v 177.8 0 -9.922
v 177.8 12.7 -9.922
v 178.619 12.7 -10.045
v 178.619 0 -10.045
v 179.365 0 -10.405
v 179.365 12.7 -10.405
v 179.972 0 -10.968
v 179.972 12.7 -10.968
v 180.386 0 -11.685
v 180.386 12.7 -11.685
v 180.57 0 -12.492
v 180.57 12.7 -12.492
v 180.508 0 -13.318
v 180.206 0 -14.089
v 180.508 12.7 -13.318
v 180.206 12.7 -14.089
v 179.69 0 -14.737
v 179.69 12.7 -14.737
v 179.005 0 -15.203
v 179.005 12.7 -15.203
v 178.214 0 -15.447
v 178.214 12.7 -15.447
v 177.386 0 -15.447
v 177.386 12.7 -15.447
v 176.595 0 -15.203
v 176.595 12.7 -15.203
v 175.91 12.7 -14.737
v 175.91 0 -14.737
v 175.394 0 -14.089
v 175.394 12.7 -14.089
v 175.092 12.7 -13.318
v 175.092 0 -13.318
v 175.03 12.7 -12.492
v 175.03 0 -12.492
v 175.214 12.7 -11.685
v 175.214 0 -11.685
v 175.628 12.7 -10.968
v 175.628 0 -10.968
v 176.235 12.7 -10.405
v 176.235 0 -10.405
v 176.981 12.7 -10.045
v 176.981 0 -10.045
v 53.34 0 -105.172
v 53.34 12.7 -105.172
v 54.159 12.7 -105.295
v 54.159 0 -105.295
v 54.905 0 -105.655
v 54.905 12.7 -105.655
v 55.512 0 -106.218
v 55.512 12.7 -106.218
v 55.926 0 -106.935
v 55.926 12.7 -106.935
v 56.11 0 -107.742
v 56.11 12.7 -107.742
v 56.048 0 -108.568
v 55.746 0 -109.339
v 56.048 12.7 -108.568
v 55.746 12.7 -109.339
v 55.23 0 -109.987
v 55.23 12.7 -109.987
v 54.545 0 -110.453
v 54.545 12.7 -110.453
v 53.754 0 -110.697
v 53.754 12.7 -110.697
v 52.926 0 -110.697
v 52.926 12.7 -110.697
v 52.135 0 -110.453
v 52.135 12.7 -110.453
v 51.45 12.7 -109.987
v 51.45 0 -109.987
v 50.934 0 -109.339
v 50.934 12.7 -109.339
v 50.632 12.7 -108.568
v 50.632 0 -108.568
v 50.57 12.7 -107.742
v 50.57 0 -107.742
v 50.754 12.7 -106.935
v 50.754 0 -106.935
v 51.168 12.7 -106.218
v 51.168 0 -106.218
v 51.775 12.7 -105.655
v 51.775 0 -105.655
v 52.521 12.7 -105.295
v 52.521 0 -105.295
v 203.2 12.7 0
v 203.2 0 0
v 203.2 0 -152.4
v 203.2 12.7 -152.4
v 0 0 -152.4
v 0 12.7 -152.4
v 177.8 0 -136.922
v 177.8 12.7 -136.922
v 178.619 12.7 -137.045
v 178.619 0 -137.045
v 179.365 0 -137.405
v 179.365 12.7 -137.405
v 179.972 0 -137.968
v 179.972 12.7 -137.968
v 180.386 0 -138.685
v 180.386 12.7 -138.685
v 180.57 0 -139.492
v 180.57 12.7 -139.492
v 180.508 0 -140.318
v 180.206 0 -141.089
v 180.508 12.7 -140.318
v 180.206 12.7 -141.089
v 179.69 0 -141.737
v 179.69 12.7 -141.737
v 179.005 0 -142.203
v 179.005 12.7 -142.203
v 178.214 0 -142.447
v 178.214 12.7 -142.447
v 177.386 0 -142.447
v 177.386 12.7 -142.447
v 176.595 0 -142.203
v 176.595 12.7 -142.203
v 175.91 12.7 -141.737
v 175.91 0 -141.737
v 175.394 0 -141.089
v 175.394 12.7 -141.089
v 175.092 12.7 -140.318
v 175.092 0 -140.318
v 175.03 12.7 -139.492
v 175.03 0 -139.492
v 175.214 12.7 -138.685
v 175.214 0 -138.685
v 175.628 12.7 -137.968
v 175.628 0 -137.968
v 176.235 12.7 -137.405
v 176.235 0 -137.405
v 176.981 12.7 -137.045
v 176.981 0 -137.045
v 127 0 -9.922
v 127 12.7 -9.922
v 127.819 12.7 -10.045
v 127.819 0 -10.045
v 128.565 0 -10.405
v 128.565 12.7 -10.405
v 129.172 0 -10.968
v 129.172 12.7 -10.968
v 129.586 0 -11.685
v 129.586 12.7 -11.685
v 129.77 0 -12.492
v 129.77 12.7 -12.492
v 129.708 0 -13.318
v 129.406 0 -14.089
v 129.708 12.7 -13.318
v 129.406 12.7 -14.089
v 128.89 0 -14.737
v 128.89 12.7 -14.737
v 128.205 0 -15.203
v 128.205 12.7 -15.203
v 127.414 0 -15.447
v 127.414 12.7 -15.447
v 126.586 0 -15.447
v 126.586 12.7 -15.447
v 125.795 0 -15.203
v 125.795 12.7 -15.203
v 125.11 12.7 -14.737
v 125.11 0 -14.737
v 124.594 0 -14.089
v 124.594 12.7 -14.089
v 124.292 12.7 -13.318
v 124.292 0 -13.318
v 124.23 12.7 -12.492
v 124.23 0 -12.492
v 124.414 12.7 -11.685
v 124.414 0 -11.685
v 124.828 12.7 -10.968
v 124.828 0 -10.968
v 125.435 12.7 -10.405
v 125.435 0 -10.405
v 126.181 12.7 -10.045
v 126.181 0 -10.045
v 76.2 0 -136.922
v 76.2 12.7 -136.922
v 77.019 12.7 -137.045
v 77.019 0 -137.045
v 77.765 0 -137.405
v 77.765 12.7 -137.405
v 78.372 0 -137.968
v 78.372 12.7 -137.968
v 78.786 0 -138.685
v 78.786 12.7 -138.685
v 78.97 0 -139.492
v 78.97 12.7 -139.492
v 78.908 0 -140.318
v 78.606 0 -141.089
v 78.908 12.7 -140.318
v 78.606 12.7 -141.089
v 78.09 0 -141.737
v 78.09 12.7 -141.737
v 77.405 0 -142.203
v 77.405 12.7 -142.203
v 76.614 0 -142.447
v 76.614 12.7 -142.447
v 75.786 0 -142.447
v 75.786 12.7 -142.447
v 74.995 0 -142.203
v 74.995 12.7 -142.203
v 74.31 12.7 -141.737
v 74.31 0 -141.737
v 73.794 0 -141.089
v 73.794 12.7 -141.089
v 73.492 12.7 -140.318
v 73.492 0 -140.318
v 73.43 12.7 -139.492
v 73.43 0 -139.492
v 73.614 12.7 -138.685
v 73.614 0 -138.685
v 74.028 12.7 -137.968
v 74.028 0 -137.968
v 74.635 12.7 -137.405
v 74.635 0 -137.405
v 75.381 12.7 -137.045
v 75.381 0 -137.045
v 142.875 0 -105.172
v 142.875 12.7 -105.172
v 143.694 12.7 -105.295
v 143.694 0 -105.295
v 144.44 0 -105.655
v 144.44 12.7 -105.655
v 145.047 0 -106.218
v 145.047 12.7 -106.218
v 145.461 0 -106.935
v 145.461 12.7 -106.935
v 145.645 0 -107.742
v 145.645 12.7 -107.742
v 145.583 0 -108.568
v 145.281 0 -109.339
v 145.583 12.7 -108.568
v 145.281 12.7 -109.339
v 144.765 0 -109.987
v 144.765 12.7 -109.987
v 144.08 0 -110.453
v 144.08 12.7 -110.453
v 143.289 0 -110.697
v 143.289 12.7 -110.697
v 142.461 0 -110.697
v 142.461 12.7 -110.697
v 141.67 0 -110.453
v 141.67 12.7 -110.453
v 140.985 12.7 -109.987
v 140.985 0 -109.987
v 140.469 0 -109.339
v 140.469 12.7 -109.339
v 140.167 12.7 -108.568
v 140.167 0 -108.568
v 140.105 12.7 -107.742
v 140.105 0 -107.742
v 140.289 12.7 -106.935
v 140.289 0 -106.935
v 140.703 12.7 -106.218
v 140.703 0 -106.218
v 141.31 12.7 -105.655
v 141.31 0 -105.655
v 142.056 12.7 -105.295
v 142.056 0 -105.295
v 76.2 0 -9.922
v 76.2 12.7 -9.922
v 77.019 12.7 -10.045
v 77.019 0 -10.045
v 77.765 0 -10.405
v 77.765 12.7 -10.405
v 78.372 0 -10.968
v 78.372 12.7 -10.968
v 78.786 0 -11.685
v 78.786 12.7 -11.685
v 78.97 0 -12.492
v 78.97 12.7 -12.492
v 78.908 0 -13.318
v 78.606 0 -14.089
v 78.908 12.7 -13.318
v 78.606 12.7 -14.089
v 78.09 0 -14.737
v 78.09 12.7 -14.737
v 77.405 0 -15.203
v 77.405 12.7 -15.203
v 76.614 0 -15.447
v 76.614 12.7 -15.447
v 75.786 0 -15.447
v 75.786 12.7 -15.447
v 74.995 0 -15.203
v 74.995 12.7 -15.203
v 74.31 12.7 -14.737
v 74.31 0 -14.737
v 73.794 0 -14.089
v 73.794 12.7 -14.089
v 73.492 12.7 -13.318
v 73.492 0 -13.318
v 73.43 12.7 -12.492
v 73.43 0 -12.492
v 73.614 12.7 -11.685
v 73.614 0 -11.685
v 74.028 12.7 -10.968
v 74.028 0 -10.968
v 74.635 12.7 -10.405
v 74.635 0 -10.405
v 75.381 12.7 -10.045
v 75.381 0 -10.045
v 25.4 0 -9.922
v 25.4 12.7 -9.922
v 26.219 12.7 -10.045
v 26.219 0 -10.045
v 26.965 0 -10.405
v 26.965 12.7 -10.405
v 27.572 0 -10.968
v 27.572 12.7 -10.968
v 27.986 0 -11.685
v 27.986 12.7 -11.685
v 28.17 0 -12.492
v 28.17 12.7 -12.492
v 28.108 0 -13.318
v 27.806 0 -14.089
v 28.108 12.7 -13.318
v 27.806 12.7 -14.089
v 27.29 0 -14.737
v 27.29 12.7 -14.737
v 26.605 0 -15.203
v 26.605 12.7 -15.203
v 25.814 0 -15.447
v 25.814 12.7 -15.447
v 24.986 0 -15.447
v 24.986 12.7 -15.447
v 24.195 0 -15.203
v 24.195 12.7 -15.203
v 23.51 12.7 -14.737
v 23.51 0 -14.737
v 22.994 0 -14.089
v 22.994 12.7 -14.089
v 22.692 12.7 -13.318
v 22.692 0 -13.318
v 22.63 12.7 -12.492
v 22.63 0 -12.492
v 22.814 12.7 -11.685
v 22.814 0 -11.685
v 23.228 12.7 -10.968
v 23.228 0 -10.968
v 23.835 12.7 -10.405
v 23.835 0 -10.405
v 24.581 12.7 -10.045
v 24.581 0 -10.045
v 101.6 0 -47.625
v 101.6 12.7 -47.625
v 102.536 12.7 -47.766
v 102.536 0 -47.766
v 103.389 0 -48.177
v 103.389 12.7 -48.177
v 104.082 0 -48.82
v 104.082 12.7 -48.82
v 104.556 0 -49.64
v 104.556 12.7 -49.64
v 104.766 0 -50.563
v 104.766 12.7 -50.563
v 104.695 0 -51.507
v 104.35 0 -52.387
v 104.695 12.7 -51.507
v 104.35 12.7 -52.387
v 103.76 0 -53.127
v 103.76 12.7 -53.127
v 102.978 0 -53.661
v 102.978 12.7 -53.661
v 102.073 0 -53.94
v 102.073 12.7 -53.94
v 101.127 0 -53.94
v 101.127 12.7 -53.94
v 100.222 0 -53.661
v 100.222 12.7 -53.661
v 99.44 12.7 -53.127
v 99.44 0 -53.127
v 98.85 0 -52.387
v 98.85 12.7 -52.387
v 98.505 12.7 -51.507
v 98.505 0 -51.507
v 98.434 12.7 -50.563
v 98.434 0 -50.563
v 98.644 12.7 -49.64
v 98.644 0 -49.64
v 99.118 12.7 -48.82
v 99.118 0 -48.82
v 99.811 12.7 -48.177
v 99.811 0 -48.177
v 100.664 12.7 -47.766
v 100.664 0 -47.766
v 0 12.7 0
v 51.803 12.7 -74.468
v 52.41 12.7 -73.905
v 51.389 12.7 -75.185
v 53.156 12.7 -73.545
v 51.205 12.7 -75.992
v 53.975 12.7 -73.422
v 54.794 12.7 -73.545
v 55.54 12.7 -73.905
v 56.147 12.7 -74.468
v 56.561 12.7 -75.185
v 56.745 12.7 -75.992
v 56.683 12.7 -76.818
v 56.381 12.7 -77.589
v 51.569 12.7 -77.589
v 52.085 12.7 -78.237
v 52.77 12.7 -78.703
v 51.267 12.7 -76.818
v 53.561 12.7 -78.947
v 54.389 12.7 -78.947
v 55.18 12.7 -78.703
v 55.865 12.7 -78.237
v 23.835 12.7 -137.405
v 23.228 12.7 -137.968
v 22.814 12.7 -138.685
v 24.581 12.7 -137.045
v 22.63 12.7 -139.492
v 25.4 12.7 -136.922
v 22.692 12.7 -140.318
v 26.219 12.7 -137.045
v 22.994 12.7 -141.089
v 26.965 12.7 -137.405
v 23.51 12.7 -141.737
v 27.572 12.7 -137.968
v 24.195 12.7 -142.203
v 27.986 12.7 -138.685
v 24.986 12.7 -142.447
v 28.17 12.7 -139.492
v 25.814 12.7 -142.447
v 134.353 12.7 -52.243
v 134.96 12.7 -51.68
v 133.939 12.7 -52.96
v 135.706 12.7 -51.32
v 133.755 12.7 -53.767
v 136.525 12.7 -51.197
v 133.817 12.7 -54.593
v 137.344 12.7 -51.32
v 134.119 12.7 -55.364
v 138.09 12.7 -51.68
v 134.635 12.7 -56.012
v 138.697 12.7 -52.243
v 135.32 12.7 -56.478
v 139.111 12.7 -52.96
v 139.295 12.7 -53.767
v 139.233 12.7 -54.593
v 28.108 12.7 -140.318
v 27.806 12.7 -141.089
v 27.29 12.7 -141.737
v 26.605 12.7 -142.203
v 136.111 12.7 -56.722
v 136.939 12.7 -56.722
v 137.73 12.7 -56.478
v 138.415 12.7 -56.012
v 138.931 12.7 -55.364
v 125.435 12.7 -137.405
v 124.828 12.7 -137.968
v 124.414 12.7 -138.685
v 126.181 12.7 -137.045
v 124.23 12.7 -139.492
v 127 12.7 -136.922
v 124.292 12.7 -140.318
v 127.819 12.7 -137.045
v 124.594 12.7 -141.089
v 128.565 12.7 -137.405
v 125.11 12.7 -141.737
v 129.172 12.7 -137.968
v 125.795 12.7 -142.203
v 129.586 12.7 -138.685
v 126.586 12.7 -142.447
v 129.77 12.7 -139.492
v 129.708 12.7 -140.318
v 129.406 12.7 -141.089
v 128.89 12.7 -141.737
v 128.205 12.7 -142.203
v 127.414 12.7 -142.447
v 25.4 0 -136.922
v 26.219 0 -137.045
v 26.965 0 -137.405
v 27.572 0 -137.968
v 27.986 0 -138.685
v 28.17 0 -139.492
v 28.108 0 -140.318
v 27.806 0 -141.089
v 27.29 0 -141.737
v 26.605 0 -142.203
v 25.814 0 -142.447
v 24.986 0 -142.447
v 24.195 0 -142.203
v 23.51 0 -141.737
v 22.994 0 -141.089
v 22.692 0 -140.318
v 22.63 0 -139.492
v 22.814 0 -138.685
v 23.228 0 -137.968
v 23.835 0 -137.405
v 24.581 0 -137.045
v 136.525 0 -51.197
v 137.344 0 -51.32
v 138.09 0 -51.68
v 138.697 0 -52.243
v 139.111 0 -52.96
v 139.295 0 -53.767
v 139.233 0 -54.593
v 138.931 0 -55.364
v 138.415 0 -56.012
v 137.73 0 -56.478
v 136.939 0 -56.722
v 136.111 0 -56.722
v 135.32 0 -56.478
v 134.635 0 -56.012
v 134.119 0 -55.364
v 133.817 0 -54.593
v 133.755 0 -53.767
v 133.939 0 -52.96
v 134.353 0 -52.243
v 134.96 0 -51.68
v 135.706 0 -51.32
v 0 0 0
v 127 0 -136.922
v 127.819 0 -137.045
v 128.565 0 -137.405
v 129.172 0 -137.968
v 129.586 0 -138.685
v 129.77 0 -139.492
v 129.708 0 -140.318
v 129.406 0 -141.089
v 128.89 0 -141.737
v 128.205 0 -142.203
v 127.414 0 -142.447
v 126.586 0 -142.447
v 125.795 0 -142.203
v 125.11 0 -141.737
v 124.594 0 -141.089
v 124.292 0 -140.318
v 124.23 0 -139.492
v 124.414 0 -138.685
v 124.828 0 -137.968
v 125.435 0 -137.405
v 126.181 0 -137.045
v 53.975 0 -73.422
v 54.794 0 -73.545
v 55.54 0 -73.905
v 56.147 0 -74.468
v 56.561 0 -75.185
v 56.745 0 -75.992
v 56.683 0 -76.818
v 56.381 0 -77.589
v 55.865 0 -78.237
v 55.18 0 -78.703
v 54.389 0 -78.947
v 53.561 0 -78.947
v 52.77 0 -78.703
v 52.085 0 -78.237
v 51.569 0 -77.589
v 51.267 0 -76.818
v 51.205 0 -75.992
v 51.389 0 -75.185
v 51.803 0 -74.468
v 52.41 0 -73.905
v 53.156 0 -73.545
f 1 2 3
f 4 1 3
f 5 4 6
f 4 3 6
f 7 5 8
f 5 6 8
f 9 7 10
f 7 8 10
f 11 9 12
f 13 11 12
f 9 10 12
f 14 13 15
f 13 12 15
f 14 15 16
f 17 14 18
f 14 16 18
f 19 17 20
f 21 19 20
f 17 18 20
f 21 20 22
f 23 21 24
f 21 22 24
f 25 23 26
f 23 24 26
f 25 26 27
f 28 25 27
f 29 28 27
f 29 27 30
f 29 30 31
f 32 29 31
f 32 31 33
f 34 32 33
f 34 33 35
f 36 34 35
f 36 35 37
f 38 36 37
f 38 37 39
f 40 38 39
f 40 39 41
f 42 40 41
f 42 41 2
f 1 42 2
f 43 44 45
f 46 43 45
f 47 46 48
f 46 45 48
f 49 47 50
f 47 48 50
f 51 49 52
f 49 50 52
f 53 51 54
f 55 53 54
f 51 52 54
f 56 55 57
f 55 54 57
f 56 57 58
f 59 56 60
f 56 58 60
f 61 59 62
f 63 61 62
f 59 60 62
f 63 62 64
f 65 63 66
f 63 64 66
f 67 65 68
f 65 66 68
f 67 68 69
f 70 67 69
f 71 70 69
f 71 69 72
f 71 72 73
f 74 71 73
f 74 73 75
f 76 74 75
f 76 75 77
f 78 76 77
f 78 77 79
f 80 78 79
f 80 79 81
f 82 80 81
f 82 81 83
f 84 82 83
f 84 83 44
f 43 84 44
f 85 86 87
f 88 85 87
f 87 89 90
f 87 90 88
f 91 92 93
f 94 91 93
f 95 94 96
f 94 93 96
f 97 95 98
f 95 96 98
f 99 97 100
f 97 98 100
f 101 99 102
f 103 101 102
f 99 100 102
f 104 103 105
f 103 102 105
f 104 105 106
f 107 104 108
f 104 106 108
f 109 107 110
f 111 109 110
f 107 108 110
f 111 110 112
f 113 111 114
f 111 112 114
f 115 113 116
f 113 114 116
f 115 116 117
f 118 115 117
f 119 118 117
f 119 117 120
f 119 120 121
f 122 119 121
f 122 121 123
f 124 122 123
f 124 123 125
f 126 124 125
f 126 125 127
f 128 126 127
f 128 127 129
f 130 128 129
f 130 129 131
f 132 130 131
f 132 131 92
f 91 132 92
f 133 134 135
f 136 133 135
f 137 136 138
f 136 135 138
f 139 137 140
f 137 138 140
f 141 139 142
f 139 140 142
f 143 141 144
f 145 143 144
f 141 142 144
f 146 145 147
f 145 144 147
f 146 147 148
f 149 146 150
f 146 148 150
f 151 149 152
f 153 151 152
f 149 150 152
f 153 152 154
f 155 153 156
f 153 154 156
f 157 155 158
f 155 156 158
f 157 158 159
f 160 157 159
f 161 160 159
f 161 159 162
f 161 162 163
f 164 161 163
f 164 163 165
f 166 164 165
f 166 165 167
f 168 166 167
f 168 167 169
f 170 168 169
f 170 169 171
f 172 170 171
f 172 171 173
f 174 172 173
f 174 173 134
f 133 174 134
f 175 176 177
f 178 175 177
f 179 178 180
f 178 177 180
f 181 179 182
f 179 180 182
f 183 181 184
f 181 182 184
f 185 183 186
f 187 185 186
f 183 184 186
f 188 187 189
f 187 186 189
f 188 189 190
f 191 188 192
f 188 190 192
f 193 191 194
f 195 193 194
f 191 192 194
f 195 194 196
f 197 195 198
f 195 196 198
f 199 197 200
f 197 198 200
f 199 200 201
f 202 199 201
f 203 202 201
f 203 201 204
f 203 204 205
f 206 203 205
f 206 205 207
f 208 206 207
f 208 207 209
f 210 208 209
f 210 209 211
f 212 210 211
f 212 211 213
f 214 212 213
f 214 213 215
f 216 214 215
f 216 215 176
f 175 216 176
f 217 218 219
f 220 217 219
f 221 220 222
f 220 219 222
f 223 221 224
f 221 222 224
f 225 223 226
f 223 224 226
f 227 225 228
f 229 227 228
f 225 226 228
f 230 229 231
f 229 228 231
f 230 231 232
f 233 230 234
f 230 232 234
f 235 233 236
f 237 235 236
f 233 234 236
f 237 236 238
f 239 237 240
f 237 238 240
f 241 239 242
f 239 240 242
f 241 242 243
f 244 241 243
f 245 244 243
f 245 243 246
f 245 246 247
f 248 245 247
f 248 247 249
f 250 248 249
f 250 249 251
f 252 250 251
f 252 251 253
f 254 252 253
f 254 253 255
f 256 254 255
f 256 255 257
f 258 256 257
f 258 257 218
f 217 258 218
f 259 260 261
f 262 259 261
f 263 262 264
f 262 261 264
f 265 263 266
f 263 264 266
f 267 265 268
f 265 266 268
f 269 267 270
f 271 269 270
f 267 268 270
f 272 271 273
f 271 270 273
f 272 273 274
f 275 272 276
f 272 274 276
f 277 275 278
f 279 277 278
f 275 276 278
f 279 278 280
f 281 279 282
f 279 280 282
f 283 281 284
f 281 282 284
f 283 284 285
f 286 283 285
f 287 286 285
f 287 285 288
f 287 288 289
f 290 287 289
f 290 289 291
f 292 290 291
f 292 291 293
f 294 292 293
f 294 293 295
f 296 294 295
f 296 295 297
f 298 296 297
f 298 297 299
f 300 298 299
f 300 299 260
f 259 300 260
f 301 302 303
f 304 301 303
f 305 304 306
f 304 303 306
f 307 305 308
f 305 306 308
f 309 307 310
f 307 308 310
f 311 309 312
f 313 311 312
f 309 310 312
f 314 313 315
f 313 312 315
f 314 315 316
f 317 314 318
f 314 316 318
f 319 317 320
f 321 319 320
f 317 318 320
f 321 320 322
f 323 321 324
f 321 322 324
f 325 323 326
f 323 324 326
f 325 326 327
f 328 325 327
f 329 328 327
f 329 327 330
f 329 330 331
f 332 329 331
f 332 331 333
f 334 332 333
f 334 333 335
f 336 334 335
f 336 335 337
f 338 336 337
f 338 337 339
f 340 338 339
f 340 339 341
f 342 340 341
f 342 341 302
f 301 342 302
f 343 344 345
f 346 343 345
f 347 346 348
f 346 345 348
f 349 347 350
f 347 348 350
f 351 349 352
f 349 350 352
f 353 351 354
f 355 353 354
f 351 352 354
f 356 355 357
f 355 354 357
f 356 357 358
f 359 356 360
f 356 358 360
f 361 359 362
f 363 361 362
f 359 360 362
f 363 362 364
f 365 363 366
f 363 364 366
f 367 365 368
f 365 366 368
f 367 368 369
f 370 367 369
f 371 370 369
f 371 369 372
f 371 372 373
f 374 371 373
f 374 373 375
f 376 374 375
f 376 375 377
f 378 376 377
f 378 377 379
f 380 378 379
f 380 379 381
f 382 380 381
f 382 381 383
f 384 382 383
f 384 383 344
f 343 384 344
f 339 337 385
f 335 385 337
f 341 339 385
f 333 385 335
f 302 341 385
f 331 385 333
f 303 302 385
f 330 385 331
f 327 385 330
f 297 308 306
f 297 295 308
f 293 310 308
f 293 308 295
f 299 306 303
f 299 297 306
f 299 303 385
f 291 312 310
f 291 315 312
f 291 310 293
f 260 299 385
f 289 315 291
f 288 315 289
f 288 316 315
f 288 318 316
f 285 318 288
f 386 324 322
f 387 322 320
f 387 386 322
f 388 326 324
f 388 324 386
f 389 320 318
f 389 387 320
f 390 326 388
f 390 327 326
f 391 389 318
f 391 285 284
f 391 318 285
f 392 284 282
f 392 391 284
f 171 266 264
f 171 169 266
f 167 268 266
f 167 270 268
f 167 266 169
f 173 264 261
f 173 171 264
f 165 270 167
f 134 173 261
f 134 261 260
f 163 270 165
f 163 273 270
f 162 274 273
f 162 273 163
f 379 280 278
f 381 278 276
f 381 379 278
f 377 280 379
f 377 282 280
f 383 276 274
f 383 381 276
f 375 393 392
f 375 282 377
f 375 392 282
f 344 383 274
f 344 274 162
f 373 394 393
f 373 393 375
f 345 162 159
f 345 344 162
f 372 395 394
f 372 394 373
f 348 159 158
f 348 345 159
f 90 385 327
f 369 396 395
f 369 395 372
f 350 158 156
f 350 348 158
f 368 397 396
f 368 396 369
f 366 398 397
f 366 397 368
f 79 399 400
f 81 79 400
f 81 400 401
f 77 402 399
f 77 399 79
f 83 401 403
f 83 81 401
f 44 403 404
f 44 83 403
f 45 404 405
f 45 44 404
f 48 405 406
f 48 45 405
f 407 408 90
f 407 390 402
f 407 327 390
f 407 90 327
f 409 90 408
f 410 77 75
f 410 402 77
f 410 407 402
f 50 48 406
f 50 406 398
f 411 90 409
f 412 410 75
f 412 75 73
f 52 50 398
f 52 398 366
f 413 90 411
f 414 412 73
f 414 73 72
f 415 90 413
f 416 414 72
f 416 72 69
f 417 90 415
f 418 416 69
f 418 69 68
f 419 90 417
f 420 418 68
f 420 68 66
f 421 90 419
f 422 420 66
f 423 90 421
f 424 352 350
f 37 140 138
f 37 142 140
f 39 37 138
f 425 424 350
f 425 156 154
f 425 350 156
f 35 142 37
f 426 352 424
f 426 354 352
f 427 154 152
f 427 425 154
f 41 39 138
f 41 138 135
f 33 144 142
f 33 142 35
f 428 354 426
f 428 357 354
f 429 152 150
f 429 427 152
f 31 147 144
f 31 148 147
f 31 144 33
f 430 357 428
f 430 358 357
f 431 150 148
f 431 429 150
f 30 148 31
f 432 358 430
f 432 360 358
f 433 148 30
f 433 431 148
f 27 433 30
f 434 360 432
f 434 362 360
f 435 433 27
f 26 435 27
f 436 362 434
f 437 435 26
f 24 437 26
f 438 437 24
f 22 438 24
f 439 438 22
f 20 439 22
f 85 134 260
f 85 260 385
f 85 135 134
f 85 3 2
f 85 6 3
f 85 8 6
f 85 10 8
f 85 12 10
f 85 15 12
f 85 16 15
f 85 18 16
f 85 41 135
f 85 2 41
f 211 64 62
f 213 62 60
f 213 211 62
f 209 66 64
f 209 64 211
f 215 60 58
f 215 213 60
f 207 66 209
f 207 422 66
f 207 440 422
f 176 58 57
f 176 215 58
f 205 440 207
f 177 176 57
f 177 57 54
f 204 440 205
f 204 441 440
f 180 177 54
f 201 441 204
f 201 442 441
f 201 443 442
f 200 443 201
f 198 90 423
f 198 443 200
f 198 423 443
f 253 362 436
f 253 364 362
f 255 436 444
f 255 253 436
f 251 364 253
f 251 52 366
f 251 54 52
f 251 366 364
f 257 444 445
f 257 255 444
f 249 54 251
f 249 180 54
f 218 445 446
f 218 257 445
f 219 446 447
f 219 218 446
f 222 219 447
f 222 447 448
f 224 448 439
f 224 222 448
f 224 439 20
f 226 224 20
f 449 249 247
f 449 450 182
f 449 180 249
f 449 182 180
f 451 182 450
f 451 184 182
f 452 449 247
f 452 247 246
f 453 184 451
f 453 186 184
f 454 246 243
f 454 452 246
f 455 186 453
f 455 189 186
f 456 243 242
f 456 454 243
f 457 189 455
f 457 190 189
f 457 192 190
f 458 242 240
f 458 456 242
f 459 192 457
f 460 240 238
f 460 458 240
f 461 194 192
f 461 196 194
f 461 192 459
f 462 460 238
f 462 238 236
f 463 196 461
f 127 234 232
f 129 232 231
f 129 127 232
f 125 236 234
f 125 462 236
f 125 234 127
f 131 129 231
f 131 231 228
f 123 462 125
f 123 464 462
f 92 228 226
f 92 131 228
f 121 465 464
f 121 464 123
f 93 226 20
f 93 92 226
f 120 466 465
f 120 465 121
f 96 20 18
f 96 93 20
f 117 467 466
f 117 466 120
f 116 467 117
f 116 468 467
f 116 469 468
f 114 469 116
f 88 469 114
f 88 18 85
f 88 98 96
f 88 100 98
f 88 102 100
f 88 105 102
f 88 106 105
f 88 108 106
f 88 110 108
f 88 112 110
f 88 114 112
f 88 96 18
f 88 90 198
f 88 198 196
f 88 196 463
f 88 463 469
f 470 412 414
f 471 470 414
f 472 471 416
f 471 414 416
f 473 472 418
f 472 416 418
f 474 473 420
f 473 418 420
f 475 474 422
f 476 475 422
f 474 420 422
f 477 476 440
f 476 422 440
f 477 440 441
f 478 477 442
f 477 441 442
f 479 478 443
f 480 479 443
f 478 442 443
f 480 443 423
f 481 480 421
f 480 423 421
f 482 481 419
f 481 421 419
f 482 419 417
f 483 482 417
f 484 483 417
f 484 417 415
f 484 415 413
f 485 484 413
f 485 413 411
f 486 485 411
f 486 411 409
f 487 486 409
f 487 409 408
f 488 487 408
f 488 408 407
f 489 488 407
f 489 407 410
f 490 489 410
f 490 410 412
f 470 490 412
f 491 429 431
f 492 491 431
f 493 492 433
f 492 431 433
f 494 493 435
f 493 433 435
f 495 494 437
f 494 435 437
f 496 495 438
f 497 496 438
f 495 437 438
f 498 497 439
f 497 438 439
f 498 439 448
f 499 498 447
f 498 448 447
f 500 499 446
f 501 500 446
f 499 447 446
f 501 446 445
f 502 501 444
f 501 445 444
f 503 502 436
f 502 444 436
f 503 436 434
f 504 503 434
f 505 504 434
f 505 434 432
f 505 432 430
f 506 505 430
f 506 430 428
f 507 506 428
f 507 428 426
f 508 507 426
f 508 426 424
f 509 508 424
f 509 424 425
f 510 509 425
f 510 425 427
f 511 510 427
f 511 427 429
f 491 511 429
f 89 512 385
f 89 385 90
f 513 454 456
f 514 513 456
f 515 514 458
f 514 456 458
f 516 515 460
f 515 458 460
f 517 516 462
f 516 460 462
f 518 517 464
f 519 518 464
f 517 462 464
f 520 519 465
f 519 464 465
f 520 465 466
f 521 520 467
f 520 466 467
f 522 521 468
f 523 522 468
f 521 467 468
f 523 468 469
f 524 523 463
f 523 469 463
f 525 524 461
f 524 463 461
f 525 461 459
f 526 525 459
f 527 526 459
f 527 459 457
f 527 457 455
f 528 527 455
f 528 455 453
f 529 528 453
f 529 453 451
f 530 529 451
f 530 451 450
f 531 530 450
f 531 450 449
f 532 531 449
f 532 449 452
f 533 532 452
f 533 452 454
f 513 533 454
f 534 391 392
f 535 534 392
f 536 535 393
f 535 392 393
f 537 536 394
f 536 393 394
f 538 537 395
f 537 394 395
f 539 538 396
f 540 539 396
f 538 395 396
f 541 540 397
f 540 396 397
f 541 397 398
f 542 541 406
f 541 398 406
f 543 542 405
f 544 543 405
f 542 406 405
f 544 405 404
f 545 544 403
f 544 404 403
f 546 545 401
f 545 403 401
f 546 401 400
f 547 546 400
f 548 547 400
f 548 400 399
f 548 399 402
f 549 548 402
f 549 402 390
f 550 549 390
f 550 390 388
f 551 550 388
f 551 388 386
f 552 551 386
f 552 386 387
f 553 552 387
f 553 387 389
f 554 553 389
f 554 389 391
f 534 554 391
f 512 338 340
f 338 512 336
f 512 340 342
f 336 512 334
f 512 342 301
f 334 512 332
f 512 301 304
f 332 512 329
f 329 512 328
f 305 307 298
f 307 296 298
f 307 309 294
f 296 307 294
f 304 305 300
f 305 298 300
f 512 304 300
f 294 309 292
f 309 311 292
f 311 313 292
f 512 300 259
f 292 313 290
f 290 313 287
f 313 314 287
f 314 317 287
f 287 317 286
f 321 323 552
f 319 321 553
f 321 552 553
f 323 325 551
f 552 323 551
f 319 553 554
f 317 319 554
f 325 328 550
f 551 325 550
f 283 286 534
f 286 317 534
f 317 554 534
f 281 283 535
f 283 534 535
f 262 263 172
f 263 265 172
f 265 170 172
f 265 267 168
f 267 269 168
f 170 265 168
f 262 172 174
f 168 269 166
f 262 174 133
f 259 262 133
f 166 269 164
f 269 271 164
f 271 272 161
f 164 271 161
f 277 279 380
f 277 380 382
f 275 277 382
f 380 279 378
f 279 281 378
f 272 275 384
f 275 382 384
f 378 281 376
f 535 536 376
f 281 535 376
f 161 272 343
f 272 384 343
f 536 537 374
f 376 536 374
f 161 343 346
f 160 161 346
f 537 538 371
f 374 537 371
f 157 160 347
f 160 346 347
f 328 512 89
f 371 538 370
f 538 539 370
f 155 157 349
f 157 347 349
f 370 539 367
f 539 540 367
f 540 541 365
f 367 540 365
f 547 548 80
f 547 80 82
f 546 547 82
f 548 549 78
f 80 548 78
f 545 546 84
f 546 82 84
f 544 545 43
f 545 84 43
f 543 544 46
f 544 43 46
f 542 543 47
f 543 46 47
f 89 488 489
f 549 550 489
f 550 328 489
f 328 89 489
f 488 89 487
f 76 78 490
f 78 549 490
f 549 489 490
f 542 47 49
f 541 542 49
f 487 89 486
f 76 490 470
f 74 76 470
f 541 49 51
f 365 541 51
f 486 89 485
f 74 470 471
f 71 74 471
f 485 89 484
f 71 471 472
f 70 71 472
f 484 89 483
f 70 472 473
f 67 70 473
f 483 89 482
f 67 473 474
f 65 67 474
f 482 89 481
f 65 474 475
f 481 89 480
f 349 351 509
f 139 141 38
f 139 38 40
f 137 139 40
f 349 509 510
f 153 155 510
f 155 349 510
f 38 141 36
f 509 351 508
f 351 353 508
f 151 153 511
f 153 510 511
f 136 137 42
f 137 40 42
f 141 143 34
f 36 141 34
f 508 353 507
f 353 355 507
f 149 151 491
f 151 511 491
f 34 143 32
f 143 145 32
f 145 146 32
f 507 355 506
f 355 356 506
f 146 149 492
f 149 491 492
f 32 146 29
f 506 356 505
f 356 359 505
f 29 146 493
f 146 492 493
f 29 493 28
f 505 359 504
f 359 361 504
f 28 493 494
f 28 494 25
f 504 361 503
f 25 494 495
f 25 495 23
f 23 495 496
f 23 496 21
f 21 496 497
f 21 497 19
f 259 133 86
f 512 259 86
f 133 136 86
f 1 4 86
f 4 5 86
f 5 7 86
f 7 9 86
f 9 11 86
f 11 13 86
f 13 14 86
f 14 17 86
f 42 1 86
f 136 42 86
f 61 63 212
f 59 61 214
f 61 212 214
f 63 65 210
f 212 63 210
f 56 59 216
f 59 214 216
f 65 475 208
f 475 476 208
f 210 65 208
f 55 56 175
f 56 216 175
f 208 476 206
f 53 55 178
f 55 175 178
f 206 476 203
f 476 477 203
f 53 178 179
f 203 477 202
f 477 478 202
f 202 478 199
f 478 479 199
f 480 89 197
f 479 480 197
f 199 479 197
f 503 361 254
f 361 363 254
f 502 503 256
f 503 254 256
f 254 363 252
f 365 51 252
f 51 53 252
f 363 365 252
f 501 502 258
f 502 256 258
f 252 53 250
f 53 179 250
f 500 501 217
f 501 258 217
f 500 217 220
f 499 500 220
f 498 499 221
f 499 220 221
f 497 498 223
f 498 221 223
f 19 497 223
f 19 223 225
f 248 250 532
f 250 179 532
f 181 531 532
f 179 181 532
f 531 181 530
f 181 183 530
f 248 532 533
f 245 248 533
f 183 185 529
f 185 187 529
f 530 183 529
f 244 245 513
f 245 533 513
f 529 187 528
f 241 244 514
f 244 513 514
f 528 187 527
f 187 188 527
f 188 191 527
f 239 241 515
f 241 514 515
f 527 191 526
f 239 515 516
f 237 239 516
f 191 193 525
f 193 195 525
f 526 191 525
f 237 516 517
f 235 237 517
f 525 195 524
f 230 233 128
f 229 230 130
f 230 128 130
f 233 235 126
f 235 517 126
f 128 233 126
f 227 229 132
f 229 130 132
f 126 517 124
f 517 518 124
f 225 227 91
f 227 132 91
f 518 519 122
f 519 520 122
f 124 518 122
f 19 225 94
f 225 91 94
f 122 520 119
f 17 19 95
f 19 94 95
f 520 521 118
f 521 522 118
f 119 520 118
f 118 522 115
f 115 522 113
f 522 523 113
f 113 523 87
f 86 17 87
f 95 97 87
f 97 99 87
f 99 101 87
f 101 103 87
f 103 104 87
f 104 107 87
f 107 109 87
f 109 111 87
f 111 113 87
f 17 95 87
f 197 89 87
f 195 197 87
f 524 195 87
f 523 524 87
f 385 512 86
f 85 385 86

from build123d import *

# Parameters (mm, degrees)
SKETCH1_W           = 203.2
SKETCH1_H           = 152.4
BOSS_EXTRUDE1_DEPTH = 12.7
SKETCH2_R           = 2.778125
CUT_EXTRUDE1_DEPTH  = 255.31730181
LPATTERN1_COUNT     = 4
LPATTERN1_PITCH     = 50.8
SKETCH4_R           = 2.778125
SKETCH4_R_2         = 3.175
CUT_EXTRUDE2_DEPTH  = 255.31730181


with BuildPart() as part:
    # Sketch1 → Boss-Extrude1 (new body)
    with BuildSketch(Plane(origin=(0, 0, 0), x_dir=(1, 0, 0), z_dir=(0, 1, 0))):
        with Locations((101.6, 76.2)):
            Rectangle(SKETCH1_W, SKETCH1_H)
    extrude(amount=BOSS_EXTRUDE1_DEPTH)

    # Sketch2 → Cut-Extrude1 (cut, through all)
    with BuildSketch(Plane(origin=(0, 12.7, 0), x_dir=(1, 0, 0), z_dir=(0, 1, 0))):
        with Locations(Location((25.4, 139.7, 0), (0, 0, 270))):
            Circle(SKETCH2_R)
        with Locations(Location((25.4, 12.7, 0), (0, 0, 270))):
            Circle(SKETCH2_R)
    cut_extrude1 = extrude(amount=-CUT_EXTRUDE1_DEPTH, mode=Mode.SUBTRACT)

    # LPattern1: Cut-Extrude1 ×4
    with Locations(*[(i * LPATTERN1_PITCH, 0, 0) for i in range(1, LPATTERN1_COUNT)]):
        add(cut_extrude1, mode=Mode.SUBTRACT)

    # Sketch4 → Cut-Extrude2 (cut, through all)
    with BuildSketch(Plane(origin=(0, 12.7, 0), x_dir=(1, 0, 0), z_dir=(0, 1, 0))):
        with Locations(Location((53.975, 76.2, 0), (0, 0, 270))):
            Circle(SKETCH4_R)
        with Locations(Location((53.34, 107.95, 0), (0, 0, 270))):
            Circle(SKETCH4_R)
        with Locations(Location((101.6, 50.8, 0), (0, 0, 270))):
            Circle(SKETCH4_R_2)
        with Locations(Location((142.875, 107.95, 0), (0, 0, 270))):
            Circle(SKETCH4_R)
        with Locations(Location((136.525, 53.975, 0), (0, 0, 270))):
            Circle(SKETCH4_R)
    extrude(amount=-CUT_EXTRUDE2_DEPTH, mode=Mode.SUBTRACT)


solid = part.part
